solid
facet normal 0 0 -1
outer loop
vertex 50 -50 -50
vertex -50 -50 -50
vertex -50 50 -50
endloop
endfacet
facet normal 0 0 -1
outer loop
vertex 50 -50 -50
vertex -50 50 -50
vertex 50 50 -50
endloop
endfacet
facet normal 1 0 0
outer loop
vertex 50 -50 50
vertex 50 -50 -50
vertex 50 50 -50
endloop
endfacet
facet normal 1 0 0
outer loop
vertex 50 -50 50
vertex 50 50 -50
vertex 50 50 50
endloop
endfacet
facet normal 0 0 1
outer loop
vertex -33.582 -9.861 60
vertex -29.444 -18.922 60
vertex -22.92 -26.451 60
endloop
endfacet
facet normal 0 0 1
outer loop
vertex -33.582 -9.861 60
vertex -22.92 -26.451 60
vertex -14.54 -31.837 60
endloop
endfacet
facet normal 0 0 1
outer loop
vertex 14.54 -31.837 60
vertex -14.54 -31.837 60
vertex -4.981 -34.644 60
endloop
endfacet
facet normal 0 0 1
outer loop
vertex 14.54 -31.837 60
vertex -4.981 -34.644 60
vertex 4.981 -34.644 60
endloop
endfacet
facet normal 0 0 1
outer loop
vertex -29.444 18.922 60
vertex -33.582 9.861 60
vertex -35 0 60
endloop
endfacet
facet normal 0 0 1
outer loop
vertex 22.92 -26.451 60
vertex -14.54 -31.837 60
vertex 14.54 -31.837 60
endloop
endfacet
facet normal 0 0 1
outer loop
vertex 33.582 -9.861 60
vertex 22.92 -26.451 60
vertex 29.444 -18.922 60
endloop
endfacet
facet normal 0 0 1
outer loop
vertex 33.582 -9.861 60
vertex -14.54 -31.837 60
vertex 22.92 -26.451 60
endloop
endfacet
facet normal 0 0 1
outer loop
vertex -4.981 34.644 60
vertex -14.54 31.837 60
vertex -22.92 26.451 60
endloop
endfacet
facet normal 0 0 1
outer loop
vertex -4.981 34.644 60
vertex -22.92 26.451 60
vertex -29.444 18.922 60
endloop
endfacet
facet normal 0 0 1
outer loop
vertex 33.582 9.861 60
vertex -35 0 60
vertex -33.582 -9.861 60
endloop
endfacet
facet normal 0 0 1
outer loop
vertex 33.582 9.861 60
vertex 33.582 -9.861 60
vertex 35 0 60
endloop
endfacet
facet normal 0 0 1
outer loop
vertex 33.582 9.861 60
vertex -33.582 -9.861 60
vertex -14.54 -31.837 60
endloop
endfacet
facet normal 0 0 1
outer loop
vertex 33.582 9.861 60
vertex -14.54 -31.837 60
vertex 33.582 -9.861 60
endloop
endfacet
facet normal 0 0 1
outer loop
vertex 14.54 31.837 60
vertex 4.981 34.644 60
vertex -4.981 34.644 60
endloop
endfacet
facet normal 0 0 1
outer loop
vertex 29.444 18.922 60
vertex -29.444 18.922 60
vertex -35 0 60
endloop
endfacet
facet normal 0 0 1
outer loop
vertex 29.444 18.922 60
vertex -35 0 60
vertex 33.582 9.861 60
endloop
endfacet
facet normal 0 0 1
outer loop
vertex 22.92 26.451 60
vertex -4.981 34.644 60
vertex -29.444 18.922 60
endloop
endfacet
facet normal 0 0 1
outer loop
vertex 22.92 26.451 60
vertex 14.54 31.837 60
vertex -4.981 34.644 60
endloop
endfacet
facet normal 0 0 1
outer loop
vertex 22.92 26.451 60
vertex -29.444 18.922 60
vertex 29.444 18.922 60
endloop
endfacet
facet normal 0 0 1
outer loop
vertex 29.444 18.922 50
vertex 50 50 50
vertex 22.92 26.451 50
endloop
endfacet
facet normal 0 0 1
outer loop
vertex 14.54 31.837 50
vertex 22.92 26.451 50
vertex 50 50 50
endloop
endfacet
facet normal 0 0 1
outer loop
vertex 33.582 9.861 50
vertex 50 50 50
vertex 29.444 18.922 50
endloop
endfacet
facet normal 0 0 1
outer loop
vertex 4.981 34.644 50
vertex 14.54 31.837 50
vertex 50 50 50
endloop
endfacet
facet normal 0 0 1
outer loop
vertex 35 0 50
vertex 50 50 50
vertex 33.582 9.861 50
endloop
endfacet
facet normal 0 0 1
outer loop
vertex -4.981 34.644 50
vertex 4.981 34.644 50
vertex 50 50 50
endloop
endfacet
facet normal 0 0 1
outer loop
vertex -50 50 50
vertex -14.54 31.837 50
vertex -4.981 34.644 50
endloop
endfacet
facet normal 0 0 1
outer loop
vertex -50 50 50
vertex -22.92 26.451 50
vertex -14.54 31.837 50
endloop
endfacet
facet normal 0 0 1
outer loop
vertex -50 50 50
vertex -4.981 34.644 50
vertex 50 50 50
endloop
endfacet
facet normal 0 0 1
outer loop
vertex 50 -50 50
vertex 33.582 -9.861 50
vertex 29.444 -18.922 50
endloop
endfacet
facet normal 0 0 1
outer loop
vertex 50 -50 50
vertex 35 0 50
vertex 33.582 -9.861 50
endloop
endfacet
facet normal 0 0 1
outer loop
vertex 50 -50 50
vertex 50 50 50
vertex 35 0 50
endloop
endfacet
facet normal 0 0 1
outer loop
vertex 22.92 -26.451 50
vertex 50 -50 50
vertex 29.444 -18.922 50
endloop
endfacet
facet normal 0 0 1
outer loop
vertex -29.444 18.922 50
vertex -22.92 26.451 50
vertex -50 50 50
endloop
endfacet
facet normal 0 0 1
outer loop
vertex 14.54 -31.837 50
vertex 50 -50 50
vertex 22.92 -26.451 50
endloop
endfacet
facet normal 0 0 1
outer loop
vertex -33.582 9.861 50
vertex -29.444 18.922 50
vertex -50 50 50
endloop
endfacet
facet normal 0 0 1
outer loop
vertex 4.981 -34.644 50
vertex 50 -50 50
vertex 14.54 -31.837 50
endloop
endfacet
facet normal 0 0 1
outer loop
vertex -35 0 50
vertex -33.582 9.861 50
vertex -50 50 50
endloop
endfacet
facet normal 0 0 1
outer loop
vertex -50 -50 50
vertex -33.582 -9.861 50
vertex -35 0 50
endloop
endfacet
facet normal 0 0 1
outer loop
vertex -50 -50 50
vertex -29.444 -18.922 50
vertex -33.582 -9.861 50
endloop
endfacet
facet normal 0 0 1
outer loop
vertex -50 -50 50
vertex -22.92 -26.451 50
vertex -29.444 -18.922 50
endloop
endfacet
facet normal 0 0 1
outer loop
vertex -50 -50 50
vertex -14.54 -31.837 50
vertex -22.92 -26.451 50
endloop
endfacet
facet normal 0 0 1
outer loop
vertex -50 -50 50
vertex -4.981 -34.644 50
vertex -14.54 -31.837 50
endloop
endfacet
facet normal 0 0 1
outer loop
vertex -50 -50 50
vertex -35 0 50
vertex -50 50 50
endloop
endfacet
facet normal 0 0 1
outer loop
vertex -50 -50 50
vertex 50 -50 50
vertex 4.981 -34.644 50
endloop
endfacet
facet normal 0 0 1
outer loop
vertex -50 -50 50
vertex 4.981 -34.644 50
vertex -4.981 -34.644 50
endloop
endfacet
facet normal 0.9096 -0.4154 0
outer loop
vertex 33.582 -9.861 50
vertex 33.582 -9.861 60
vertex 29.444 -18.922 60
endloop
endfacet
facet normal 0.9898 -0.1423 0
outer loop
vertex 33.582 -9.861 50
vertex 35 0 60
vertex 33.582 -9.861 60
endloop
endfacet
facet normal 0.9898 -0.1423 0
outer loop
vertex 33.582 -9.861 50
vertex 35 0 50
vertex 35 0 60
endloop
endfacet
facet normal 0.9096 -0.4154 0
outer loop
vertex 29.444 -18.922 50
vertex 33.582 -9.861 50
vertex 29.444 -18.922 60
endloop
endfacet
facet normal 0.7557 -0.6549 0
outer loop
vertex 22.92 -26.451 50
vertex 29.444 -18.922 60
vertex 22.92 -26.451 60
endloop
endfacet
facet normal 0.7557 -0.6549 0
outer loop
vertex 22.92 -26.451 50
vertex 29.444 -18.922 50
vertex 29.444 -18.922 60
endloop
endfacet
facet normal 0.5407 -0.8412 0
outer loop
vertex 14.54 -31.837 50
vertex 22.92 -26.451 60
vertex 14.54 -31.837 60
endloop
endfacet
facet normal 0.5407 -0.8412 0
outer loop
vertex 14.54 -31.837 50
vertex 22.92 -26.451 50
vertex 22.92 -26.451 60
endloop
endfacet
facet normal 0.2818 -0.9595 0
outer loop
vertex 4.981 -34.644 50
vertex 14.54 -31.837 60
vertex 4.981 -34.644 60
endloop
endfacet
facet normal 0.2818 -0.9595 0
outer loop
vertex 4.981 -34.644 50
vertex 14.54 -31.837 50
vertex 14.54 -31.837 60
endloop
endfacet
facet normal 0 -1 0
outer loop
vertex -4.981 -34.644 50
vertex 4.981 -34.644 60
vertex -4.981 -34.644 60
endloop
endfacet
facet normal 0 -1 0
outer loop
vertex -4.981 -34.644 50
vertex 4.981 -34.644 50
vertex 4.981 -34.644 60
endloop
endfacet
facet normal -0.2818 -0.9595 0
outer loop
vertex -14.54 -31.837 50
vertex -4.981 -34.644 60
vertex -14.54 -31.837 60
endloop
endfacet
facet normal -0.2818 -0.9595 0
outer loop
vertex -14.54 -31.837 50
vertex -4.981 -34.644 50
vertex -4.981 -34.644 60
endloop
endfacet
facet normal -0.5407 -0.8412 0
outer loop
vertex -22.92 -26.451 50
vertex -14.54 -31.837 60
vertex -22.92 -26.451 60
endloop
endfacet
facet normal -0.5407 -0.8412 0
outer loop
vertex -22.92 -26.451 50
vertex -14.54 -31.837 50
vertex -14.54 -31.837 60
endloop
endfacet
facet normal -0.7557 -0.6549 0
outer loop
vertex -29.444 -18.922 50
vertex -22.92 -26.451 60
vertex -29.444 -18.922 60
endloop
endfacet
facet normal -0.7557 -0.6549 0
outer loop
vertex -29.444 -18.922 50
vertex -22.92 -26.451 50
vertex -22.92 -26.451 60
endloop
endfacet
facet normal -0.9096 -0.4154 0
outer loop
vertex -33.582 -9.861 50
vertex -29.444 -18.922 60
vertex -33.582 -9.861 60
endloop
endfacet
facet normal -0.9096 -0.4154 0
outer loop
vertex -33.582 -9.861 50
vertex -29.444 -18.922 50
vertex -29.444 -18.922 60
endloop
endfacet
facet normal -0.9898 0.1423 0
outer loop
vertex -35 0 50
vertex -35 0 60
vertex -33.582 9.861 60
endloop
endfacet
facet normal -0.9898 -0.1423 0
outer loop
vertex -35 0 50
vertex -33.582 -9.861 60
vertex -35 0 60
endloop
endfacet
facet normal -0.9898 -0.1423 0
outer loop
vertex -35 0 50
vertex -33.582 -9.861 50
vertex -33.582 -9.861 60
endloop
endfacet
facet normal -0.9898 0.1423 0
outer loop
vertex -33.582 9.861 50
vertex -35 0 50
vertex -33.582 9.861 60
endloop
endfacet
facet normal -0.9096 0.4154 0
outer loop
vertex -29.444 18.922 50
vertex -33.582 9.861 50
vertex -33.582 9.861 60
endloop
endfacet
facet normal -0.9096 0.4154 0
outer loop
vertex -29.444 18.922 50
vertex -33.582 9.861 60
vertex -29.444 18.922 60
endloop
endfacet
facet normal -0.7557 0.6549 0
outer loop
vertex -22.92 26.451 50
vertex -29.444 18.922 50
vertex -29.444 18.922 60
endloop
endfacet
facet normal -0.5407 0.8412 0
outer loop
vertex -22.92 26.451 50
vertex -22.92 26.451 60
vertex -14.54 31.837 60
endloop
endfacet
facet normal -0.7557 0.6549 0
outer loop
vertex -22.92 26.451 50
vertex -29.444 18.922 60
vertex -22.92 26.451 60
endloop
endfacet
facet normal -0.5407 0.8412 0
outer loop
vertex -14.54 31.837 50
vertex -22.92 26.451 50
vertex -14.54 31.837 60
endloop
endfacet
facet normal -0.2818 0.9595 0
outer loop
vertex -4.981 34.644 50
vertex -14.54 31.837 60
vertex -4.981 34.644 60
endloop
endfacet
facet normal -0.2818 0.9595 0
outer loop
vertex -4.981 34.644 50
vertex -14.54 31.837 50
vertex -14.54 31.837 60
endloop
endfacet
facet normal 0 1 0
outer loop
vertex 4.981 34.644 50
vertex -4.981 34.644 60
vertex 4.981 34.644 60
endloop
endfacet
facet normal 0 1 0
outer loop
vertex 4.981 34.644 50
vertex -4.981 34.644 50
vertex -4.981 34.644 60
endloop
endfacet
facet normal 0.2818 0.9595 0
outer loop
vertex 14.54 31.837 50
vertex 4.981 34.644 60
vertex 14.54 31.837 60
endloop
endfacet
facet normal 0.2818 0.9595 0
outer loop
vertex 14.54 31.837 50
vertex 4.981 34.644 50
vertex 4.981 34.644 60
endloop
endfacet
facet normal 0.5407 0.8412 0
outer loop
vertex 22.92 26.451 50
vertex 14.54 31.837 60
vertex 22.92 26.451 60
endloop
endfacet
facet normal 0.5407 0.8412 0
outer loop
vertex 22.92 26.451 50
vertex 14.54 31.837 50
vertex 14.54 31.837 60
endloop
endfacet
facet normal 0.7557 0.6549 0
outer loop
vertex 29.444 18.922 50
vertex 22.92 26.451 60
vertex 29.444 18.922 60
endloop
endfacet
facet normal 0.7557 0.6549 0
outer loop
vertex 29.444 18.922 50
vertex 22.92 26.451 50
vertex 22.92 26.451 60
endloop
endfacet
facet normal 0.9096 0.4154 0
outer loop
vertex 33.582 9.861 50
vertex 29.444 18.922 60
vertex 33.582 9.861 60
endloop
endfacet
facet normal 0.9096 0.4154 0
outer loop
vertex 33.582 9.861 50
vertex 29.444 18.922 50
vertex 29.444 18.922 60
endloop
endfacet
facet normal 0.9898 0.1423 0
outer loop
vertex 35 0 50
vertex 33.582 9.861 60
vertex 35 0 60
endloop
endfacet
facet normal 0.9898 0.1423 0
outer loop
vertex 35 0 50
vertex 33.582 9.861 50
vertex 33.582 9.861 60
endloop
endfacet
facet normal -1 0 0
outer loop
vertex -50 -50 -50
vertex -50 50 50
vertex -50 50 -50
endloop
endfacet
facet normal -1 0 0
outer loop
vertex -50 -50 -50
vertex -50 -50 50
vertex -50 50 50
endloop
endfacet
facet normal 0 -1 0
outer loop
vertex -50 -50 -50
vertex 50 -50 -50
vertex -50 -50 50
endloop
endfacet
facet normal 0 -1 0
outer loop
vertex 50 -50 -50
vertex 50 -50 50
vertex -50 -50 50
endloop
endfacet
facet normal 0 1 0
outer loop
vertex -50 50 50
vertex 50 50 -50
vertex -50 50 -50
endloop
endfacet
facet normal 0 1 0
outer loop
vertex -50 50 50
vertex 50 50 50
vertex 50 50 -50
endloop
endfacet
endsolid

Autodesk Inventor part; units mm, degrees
ref_plane "YZ Plane" through (0, 0, 0) normal (1, 0, 0) x (0, 1, 0)
ref_plane "XZ Plane" through (0, 0, 0) normal (0, 1, 0) x (-1, 0, 0)
ref_plane "XY Plane" through (0, 0, 0) normal (0, 0, 1) x (1, 0, 0)
sketch "Эскиз1" plane through (0, 0, 0) normal (0, 1, 0) x (-1, 0, 0)
  line L0 (-50, 50) -> (50, 50)
  line L1 (50, 50) -> (50, -50)
  line L2 (50, -50) -> (-50, -50)
  line L3 (-50, -50) -> (-50, 50)
  line L4 (-50, 50) -> (50, -50) construction
  line L5 (50, 50) -> (-50, -50) construction
  point P0 (0, 0)
  dimension "d0" = 100
  dimension "d1" = 100
extrude "Выдавливание1" add sketch "Эскиз1" along normal mid plane 100
sketch "Эскиз2" plane through (-50, 50, 50) normal (0, 0, 1) x (1, 0, 0)
  circle A0 centre (50, -50) radius 35
  dimension "d4" = 70
extrude "Выдавливание2" add sketch "Эскиз2" along normal blind 10
properties part number "motor" material "Пластик АБС"
